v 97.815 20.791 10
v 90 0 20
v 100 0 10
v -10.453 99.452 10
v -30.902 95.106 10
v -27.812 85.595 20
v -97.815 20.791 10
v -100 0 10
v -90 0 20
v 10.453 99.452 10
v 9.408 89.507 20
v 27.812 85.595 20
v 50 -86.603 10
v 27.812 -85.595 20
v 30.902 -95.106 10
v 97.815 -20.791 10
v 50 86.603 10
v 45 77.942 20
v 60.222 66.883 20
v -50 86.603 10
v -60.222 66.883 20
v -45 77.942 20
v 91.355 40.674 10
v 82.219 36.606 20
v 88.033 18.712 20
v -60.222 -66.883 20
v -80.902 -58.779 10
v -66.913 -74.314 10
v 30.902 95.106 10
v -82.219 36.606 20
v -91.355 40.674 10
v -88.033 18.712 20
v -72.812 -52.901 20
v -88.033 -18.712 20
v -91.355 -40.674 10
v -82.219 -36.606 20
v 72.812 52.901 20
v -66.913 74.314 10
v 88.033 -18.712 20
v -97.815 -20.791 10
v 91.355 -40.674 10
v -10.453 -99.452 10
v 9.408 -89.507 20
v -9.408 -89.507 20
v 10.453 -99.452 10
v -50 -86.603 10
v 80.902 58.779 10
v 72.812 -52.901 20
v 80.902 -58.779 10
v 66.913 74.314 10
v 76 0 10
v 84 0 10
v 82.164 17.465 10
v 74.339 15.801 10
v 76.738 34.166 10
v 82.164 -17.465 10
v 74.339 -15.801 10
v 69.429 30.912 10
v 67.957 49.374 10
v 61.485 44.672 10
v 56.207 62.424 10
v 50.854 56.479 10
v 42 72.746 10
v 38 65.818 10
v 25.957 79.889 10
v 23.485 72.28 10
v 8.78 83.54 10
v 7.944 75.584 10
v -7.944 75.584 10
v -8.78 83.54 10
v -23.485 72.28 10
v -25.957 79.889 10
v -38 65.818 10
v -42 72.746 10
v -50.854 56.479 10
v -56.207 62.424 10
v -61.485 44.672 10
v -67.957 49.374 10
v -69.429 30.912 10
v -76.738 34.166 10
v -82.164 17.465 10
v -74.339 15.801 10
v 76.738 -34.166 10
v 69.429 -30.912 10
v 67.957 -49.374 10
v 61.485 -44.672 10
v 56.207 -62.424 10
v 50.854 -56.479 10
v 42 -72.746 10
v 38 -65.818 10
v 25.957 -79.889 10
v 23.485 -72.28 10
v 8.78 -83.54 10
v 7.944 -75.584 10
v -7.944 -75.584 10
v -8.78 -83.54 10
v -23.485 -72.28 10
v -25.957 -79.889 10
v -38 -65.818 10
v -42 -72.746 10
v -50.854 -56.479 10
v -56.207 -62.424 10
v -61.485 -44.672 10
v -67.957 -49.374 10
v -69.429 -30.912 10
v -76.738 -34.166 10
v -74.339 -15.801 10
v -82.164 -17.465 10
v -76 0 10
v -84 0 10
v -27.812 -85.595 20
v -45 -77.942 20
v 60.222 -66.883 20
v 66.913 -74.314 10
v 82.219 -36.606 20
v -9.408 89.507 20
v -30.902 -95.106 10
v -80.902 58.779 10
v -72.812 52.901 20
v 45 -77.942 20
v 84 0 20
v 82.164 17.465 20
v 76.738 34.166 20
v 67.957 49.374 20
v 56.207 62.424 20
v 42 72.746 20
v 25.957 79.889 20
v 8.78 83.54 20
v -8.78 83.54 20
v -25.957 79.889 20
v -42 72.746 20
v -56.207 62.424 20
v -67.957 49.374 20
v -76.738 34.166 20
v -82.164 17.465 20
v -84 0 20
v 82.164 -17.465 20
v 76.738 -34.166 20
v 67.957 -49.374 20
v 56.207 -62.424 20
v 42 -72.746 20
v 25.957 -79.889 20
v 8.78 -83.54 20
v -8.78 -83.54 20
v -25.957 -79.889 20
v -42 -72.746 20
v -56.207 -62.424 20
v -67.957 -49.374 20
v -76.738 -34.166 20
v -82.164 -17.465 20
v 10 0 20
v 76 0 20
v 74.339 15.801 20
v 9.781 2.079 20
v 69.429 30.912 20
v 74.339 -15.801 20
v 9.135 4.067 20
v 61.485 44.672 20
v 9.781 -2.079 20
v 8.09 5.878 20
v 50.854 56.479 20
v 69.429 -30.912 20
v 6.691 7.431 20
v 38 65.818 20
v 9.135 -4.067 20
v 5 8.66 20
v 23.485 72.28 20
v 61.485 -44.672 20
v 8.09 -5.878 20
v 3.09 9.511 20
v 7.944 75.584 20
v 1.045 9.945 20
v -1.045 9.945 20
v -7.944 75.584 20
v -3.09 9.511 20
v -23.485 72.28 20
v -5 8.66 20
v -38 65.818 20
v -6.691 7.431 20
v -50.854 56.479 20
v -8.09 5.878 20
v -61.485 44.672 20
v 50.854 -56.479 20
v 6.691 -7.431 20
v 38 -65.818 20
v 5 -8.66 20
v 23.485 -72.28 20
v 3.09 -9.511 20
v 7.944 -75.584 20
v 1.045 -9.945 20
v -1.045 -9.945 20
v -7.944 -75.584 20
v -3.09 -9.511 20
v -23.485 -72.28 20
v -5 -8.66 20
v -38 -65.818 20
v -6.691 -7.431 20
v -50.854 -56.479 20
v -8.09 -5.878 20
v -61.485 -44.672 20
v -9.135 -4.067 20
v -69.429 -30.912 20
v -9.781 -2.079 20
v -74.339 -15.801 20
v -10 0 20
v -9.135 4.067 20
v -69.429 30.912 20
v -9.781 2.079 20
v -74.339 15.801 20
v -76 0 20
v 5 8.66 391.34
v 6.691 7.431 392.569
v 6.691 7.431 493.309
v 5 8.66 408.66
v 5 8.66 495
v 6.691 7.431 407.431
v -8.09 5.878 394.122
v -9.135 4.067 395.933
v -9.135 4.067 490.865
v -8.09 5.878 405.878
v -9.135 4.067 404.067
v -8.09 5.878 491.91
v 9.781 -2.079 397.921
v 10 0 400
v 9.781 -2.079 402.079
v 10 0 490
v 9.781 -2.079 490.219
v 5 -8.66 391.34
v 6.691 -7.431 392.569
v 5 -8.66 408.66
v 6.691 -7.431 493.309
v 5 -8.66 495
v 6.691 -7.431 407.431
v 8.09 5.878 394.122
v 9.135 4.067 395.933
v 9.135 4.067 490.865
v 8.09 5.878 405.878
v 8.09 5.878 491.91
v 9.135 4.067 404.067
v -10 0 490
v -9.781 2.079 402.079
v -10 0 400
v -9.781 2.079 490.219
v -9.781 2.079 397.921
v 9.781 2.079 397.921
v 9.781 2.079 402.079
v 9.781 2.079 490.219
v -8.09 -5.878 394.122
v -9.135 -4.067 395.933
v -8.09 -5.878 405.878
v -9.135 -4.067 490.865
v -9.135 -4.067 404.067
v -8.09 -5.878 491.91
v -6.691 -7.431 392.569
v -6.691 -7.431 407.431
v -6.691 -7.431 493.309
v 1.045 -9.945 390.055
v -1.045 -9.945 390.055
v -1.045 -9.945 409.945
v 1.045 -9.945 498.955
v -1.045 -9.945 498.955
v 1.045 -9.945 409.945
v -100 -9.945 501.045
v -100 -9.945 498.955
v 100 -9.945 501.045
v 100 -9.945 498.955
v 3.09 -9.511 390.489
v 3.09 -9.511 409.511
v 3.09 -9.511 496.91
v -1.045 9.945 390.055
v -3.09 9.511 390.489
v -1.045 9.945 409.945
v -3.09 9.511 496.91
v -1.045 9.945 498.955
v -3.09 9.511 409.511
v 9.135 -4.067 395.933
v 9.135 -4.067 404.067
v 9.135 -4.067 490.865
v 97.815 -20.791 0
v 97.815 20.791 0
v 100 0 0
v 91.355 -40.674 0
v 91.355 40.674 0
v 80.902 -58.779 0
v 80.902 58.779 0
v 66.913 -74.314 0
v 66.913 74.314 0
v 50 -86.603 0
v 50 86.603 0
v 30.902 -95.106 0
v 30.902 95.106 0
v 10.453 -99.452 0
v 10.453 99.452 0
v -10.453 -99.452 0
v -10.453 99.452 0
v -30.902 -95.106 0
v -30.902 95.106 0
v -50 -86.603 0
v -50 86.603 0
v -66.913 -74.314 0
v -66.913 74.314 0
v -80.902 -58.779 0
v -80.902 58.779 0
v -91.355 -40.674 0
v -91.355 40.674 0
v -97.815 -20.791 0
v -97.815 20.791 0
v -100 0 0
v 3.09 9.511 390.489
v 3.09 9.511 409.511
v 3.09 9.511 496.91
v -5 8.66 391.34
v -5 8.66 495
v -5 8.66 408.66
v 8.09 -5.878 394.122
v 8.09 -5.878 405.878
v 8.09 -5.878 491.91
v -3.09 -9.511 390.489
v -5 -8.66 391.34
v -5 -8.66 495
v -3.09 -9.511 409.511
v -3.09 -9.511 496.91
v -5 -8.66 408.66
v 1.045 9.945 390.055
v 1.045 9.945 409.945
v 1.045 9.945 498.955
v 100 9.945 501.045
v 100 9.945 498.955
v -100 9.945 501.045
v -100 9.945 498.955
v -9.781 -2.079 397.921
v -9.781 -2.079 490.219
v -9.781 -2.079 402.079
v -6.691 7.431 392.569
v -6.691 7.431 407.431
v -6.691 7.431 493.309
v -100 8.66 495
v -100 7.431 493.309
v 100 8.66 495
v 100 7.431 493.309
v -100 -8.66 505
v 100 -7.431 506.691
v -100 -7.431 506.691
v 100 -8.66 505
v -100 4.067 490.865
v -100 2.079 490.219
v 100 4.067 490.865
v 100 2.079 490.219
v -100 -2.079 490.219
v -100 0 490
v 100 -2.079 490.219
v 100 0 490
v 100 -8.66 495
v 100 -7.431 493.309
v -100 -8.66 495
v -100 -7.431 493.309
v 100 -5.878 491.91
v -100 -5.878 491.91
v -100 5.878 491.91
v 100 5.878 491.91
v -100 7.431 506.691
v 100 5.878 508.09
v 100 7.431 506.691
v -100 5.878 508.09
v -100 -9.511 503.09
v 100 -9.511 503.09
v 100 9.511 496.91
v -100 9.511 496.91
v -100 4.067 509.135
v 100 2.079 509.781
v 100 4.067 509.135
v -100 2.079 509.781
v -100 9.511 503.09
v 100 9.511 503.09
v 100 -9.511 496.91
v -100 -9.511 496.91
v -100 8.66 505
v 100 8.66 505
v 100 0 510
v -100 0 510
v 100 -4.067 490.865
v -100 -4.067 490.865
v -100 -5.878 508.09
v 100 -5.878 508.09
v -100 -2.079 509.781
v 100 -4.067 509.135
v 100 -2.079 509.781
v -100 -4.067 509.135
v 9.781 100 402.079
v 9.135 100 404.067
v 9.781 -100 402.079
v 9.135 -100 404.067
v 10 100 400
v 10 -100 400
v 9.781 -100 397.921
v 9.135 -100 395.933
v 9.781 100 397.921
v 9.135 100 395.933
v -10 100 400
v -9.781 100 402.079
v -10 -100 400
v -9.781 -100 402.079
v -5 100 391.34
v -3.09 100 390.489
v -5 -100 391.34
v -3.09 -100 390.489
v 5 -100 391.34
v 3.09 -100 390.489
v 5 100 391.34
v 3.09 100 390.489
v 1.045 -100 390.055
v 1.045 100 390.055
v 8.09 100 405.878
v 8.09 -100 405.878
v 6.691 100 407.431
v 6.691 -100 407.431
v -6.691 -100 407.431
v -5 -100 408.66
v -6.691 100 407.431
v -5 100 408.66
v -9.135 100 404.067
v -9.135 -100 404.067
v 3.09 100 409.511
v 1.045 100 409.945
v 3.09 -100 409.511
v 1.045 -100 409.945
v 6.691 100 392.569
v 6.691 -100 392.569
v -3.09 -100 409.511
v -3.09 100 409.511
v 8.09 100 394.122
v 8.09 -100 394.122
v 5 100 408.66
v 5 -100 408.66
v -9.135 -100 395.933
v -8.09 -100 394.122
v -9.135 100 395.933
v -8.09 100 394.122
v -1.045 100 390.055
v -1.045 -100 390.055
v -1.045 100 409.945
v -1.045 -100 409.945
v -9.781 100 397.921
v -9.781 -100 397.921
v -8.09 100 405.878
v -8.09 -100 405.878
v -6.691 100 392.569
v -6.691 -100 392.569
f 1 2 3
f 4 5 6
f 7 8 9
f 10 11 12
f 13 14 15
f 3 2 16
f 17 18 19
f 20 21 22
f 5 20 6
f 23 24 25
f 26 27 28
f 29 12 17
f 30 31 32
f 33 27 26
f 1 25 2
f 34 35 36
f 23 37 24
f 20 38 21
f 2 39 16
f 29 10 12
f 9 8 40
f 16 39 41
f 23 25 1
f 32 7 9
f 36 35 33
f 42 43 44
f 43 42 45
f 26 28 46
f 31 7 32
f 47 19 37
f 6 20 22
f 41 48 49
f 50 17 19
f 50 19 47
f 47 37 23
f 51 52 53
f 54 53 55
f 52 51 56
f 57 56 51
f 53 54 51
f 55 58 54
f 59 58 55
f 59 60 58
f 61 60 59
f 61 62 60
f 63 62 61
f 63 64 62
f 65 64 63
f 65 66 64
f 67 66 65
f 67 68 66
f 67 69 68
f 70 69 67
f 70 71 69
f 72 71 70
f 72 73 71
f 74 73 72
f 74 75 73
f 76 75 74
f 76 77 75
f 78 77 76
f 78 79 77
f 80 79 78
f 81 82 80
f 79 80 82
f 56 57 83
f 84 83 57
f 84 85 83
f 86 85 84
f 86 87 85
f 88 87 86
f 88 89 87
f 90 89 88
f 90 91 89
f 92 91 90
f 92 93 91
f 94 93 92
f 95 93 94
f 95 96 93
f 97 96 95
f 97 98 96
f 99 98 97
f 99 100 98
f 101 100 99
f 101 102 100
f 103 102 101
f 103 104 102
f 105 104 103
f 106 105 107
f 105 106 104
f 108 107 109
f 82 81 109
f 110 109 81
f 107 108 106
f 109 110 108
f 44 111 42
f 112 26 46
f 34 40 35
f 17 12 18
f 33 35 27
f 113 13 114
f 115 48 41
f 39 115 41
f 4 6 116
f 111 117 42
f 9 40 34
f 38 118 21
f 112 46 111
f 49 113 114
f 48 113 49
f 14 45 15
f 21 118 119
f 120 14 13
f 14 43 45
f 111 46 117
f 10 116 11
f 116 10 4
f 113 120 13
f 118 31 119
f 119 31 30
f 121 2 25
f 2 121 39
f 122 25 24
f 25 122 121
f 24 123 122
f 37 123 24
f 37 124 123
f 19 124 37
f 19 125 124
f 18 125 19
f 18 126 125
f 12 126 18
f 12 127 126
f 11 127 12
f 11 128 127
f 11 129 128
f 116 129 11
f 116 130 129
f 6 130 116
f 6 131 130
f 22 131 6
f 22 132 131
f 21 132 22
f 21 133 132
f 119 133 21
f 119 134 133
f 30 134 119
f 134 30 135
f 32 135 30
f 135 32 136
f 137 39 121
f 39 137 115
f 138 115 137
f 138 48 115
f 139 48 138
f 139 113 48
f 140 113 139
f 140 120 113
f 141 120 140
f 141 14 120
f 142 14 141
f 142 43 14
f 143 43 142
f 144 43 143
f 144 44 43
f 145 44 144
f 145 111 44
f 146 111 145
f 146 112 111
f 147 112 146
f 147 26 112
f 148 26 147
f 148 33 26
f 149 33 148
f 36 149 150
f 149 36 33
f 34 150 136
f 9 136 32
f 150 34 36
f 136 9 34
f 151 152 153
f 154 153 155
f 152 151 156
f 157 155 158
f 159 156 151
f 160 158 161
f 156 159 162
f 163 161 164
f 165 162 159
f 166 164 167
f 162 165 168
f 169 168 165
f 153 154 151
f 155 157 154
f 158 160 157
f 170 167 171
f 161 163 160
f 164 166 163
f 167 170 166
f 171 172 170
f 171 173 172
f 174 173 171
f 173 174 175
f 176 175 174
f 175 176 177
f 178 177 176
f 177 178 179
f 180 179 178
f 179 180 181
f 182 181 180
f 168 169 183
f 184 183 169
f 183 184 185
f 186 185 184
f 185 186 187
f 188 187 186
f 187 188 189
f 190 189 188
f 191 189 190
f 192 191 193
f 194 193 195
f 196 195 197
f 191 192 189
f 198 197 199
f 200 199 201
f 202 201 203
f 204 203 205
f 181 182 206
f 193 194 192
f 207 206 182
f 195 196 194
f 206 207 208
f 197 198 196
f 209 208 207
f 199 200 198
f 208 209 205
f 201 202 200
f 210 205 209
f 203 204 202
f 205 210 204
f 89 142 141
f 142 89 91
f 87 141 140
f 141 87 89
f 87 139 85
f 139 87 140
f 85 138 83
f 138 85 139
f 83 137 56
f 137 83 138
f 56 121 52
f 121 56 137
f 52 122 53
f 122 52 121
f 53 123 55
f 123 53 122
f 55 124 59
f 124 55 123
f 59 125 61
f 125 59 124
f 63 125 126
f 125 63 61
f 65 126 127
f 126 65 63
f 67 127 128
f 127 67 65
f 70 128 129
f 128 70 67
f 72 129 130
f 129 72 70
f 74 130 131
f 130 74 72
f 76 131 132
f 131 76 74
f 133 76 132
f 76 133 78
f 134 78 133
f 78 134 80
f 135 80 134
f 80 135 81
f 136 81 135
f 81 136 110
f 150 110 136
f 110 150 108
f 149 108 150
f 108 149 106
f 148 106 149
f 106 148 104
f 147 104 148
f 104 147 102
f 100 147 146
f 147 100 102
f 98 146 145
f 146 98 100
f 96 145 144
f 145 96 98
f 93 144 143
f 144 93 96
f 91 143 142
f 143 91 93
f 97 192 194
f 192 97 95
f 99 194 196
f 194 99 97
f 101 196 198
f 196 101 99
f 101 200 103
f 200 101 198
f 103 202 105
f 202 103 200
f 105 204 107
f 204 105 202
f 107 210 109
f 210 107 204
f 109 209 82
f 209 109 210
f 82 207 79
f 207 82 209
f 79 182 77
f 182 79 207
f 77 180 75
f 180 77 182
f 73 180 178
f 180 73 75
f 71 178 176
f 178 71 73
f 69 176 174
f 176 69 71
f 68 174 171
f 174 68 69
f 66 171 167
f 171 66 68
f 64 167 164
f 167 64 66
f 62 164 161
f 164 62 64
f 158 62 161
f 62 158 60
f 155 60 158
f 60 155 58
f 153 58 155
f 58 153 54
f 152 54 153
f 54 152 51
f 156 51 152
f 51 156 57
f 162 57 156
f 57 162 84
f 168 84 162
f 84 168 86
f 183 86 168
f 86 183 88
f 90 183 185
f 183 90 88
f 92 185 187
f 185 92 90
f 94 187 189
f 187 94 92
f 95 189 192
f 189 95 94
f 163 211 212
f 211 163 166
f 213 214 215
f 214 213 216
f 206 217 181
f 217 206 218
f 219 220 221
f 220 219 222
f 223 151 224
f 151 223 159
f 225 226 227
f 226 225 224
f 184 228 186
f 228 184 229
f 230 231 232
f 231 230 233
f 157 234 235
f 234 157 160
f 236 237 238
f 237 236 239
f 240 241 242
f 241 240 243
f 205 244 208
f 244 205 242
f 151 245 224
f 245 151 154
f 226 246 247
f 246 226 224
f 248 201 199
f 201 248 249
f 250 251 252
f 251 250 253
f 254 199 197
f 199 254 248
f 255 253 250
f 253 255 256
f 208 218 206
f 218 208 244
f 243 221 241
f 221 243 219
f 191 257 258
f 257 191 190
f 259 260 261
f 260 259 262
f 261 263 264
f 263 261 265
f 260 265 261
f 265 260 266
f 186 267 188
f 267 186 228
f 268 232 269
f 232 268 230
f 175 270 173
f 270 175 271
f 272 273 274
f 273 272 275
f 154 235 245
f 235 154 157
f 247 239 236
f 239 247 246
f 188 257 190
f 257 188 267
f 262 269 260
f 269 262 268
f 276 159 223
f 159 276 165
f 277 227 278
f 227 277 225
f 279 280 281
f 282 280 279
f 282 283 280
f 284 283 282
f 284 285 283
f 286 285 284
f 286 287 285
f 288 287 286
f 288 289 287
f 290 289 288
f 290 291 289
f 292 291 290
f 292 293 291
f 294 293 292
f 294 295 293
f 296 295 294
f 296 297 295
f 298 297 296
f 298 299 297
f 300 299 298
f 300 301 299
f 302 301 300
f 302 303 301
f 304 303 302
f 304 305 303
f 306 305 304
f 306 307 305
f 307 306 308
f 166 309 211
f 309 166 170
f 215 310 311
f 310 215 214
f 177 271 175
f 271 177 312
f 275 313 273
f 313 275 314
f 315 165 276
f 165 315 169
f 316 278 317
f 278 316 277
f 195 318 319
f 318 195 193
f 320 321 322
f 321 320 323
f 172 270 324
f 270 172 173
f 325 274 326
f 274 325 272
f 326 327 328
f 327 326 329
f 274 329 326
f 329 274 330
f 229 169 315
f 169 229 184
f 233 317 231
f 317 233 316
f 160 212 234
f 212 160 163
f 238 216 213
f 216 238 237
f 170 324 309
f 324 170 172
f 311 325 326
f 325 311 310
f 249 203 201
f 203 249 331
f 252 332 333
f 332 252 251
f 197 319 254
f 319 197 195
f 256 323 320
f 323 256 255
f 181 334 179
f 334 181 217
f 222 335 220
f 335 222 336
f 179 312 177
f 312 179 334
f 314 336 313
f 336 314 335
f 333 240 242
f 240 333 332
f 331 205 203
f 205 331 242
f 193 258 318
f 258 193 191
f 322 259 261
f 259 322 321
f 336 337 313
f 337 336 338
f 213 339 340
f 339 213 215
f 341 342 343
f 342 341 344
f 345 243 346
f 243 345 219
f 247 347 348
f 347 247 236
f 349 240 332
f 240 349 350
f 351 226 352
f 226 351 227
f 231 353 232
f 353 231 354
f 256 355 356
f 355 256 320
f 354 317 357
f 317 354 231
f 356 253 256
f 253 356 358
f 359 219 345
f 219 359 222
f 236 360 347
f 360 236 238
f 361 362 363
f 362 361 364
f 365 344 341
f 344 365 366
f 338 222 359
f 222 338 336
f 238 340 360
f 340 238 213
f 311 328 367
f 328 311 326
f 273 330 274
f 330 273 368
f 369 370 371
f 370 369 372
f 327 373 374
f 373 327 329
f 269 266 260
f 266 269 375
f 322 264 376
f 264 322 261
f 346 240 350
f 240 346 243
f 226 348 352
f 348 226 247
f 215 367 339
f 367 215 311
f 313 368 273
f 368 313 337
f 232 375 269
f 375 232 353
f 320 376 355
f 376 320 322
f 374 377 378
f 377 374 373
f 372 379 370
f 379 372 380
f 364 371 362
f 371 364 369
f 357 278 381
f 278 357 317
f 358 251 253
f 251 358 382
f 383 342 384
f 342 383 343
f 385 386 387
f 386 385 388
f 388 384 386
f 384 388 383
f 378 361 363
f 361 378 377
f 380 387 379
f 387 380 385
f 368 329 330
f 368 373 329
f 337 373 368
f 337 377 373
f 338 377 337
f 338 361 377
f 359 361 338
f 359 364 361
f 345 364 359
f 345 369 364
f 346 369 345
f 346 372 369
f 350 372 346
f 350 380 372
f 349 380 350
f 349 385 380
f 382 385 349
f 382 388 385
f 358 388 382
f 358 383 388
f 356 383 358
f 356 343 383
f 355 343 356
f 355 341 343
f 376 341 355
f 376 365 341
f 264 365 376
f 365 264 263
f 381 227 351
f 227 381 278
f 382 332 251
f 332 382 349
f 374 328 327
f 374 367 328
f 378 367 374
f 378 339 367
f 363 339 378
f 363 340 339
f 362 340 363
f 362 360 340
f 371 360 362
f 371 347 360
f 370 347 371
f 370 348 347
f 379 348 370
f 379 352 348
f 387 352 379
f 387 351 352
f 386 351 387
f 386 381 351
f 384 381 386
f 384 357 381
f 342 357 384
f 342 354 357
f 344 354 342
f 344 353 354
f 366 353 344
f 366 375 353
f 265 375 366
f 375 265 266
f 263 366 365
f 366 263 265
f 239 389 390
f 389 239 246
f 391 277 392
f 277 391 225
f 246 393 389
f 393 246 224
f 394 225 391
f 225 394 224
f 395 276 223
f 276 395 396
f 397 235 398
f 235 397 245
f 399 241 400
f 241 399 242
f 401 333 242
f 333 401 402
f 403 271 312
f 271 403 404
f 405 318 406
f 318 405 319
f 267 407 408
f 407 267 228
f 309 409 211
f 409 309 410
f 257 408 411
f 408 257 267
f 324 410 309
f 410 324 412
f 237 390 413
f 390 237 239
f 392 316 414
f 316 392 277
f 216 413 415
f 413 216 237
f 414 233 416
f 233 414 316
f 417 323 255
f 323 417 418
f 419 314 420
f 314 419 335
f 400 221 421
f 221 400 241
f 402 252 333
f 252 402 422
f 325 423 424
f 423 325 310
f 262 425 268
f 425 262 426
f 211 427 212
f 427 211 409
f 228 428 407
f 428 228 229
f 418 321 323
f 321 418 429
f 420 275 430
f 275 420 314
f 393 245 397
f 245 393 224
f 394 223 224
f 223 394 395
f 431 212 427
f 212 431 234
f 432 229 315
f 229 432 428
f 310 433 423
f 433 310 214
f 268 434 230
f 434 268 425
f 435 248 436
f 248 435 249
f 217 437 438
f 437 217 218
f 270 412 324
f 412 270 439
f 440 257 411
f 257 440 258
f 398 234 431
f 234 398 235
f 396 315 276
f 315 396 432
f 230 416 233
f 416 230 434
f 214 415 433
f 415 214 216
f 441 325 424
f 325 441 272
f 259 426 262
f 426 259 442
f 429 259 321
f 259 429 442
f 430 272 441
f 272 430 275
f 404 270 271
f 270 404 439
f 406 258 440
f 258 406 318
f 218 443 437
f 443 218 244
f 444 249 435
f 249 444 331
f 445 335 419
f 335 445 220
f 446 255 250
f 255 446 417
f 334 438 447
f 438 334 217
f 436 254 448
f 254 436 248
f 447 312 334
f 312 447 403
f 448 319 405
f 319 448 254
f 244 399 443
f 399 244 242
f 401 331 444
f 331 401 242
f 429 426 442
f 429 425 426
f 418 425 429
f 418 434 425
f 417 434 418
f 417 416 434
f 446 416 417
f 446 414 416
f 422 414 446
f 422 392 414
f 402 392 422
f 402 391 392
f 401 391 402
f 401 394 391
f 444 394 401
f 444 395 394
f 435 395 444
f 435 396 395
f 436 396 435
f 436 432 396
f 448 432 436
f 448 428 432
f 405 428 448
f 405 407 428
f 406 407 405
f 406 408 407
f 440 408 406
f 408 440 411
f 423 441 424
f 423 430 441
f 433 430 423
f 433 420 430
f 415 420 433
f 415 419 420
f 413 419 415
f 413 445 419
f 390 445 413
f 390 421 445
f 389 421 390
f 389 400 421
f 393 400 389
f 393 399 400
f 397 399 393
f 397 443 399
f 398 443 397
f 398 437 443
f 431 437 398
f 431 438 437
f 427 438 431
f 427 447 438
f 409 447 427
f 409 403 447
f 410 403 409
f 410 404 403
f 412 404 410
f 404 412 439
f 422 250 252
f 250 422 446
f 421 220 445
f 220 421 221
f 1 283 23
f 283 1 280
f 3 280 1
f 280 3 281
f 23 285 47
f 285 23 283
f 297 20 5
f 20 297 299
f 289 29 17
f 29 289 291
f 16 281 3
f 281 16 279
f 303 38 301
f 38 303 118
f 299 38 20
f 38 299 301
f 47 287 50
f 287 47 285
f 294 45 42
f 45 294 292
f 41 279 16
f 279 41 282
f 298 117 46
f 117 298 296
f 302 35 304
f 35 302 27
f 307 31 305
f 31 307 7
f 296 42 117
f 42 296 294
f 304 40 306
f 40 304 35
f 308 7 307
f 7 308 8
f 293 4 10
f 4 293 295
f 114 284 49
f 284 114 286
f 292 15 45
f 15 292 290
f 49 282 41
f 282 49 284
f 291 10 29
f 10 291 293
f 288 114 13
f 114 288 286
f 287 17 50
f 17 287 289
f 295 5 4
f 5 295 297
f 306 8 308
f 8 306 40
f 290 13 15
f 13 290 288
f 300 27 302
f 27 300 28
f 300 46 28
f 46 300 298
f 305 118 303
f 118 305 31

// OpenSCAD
bottomheigh=10;
radius=100;

bodyheigh=10;
rauiussmall=90;

thickness=8;
holedeep=10;

stickheigh=500;
stickradius=10;

branchlong=200;
branchradius=10;

branch02heigh=100;
///////////////////////////////////RENDER

//middle stick
stick();

//branch01
rotate(a=90,v=[0,1,0]){
translate([-stickheigh,0,0])
branch();
}    
//branch02
rotate(a=90,v=[1,0,0]){
translate([0,stickheigh-branch02heigh,0])
branch();
}
//body
difference(){
    
translate([0,0,bottomheigh])
body();
    
translate([0,0,bodyheigh])
linear_extrude(heigh=holedeep)
hole();    

}
//bottom
bottom();

///////////////////////////////////MODULE

module bottom(){
cylinder(h=bottomheigh,r=radius);
}

module body(){
cylinder(h=bodyheigh,r1=radius,r2=rauiussmall);   
}
module hole(){
difference(){
circle(r=rauiussmall-6);
circle(r=rauiussmall-6-thickness);
}
}
module stick(){
cylinder(h=stickheigh,r=stickradius);
}
module branch(){
  cylinder(h=branchlong,r=branchradius,center=true);  
}
